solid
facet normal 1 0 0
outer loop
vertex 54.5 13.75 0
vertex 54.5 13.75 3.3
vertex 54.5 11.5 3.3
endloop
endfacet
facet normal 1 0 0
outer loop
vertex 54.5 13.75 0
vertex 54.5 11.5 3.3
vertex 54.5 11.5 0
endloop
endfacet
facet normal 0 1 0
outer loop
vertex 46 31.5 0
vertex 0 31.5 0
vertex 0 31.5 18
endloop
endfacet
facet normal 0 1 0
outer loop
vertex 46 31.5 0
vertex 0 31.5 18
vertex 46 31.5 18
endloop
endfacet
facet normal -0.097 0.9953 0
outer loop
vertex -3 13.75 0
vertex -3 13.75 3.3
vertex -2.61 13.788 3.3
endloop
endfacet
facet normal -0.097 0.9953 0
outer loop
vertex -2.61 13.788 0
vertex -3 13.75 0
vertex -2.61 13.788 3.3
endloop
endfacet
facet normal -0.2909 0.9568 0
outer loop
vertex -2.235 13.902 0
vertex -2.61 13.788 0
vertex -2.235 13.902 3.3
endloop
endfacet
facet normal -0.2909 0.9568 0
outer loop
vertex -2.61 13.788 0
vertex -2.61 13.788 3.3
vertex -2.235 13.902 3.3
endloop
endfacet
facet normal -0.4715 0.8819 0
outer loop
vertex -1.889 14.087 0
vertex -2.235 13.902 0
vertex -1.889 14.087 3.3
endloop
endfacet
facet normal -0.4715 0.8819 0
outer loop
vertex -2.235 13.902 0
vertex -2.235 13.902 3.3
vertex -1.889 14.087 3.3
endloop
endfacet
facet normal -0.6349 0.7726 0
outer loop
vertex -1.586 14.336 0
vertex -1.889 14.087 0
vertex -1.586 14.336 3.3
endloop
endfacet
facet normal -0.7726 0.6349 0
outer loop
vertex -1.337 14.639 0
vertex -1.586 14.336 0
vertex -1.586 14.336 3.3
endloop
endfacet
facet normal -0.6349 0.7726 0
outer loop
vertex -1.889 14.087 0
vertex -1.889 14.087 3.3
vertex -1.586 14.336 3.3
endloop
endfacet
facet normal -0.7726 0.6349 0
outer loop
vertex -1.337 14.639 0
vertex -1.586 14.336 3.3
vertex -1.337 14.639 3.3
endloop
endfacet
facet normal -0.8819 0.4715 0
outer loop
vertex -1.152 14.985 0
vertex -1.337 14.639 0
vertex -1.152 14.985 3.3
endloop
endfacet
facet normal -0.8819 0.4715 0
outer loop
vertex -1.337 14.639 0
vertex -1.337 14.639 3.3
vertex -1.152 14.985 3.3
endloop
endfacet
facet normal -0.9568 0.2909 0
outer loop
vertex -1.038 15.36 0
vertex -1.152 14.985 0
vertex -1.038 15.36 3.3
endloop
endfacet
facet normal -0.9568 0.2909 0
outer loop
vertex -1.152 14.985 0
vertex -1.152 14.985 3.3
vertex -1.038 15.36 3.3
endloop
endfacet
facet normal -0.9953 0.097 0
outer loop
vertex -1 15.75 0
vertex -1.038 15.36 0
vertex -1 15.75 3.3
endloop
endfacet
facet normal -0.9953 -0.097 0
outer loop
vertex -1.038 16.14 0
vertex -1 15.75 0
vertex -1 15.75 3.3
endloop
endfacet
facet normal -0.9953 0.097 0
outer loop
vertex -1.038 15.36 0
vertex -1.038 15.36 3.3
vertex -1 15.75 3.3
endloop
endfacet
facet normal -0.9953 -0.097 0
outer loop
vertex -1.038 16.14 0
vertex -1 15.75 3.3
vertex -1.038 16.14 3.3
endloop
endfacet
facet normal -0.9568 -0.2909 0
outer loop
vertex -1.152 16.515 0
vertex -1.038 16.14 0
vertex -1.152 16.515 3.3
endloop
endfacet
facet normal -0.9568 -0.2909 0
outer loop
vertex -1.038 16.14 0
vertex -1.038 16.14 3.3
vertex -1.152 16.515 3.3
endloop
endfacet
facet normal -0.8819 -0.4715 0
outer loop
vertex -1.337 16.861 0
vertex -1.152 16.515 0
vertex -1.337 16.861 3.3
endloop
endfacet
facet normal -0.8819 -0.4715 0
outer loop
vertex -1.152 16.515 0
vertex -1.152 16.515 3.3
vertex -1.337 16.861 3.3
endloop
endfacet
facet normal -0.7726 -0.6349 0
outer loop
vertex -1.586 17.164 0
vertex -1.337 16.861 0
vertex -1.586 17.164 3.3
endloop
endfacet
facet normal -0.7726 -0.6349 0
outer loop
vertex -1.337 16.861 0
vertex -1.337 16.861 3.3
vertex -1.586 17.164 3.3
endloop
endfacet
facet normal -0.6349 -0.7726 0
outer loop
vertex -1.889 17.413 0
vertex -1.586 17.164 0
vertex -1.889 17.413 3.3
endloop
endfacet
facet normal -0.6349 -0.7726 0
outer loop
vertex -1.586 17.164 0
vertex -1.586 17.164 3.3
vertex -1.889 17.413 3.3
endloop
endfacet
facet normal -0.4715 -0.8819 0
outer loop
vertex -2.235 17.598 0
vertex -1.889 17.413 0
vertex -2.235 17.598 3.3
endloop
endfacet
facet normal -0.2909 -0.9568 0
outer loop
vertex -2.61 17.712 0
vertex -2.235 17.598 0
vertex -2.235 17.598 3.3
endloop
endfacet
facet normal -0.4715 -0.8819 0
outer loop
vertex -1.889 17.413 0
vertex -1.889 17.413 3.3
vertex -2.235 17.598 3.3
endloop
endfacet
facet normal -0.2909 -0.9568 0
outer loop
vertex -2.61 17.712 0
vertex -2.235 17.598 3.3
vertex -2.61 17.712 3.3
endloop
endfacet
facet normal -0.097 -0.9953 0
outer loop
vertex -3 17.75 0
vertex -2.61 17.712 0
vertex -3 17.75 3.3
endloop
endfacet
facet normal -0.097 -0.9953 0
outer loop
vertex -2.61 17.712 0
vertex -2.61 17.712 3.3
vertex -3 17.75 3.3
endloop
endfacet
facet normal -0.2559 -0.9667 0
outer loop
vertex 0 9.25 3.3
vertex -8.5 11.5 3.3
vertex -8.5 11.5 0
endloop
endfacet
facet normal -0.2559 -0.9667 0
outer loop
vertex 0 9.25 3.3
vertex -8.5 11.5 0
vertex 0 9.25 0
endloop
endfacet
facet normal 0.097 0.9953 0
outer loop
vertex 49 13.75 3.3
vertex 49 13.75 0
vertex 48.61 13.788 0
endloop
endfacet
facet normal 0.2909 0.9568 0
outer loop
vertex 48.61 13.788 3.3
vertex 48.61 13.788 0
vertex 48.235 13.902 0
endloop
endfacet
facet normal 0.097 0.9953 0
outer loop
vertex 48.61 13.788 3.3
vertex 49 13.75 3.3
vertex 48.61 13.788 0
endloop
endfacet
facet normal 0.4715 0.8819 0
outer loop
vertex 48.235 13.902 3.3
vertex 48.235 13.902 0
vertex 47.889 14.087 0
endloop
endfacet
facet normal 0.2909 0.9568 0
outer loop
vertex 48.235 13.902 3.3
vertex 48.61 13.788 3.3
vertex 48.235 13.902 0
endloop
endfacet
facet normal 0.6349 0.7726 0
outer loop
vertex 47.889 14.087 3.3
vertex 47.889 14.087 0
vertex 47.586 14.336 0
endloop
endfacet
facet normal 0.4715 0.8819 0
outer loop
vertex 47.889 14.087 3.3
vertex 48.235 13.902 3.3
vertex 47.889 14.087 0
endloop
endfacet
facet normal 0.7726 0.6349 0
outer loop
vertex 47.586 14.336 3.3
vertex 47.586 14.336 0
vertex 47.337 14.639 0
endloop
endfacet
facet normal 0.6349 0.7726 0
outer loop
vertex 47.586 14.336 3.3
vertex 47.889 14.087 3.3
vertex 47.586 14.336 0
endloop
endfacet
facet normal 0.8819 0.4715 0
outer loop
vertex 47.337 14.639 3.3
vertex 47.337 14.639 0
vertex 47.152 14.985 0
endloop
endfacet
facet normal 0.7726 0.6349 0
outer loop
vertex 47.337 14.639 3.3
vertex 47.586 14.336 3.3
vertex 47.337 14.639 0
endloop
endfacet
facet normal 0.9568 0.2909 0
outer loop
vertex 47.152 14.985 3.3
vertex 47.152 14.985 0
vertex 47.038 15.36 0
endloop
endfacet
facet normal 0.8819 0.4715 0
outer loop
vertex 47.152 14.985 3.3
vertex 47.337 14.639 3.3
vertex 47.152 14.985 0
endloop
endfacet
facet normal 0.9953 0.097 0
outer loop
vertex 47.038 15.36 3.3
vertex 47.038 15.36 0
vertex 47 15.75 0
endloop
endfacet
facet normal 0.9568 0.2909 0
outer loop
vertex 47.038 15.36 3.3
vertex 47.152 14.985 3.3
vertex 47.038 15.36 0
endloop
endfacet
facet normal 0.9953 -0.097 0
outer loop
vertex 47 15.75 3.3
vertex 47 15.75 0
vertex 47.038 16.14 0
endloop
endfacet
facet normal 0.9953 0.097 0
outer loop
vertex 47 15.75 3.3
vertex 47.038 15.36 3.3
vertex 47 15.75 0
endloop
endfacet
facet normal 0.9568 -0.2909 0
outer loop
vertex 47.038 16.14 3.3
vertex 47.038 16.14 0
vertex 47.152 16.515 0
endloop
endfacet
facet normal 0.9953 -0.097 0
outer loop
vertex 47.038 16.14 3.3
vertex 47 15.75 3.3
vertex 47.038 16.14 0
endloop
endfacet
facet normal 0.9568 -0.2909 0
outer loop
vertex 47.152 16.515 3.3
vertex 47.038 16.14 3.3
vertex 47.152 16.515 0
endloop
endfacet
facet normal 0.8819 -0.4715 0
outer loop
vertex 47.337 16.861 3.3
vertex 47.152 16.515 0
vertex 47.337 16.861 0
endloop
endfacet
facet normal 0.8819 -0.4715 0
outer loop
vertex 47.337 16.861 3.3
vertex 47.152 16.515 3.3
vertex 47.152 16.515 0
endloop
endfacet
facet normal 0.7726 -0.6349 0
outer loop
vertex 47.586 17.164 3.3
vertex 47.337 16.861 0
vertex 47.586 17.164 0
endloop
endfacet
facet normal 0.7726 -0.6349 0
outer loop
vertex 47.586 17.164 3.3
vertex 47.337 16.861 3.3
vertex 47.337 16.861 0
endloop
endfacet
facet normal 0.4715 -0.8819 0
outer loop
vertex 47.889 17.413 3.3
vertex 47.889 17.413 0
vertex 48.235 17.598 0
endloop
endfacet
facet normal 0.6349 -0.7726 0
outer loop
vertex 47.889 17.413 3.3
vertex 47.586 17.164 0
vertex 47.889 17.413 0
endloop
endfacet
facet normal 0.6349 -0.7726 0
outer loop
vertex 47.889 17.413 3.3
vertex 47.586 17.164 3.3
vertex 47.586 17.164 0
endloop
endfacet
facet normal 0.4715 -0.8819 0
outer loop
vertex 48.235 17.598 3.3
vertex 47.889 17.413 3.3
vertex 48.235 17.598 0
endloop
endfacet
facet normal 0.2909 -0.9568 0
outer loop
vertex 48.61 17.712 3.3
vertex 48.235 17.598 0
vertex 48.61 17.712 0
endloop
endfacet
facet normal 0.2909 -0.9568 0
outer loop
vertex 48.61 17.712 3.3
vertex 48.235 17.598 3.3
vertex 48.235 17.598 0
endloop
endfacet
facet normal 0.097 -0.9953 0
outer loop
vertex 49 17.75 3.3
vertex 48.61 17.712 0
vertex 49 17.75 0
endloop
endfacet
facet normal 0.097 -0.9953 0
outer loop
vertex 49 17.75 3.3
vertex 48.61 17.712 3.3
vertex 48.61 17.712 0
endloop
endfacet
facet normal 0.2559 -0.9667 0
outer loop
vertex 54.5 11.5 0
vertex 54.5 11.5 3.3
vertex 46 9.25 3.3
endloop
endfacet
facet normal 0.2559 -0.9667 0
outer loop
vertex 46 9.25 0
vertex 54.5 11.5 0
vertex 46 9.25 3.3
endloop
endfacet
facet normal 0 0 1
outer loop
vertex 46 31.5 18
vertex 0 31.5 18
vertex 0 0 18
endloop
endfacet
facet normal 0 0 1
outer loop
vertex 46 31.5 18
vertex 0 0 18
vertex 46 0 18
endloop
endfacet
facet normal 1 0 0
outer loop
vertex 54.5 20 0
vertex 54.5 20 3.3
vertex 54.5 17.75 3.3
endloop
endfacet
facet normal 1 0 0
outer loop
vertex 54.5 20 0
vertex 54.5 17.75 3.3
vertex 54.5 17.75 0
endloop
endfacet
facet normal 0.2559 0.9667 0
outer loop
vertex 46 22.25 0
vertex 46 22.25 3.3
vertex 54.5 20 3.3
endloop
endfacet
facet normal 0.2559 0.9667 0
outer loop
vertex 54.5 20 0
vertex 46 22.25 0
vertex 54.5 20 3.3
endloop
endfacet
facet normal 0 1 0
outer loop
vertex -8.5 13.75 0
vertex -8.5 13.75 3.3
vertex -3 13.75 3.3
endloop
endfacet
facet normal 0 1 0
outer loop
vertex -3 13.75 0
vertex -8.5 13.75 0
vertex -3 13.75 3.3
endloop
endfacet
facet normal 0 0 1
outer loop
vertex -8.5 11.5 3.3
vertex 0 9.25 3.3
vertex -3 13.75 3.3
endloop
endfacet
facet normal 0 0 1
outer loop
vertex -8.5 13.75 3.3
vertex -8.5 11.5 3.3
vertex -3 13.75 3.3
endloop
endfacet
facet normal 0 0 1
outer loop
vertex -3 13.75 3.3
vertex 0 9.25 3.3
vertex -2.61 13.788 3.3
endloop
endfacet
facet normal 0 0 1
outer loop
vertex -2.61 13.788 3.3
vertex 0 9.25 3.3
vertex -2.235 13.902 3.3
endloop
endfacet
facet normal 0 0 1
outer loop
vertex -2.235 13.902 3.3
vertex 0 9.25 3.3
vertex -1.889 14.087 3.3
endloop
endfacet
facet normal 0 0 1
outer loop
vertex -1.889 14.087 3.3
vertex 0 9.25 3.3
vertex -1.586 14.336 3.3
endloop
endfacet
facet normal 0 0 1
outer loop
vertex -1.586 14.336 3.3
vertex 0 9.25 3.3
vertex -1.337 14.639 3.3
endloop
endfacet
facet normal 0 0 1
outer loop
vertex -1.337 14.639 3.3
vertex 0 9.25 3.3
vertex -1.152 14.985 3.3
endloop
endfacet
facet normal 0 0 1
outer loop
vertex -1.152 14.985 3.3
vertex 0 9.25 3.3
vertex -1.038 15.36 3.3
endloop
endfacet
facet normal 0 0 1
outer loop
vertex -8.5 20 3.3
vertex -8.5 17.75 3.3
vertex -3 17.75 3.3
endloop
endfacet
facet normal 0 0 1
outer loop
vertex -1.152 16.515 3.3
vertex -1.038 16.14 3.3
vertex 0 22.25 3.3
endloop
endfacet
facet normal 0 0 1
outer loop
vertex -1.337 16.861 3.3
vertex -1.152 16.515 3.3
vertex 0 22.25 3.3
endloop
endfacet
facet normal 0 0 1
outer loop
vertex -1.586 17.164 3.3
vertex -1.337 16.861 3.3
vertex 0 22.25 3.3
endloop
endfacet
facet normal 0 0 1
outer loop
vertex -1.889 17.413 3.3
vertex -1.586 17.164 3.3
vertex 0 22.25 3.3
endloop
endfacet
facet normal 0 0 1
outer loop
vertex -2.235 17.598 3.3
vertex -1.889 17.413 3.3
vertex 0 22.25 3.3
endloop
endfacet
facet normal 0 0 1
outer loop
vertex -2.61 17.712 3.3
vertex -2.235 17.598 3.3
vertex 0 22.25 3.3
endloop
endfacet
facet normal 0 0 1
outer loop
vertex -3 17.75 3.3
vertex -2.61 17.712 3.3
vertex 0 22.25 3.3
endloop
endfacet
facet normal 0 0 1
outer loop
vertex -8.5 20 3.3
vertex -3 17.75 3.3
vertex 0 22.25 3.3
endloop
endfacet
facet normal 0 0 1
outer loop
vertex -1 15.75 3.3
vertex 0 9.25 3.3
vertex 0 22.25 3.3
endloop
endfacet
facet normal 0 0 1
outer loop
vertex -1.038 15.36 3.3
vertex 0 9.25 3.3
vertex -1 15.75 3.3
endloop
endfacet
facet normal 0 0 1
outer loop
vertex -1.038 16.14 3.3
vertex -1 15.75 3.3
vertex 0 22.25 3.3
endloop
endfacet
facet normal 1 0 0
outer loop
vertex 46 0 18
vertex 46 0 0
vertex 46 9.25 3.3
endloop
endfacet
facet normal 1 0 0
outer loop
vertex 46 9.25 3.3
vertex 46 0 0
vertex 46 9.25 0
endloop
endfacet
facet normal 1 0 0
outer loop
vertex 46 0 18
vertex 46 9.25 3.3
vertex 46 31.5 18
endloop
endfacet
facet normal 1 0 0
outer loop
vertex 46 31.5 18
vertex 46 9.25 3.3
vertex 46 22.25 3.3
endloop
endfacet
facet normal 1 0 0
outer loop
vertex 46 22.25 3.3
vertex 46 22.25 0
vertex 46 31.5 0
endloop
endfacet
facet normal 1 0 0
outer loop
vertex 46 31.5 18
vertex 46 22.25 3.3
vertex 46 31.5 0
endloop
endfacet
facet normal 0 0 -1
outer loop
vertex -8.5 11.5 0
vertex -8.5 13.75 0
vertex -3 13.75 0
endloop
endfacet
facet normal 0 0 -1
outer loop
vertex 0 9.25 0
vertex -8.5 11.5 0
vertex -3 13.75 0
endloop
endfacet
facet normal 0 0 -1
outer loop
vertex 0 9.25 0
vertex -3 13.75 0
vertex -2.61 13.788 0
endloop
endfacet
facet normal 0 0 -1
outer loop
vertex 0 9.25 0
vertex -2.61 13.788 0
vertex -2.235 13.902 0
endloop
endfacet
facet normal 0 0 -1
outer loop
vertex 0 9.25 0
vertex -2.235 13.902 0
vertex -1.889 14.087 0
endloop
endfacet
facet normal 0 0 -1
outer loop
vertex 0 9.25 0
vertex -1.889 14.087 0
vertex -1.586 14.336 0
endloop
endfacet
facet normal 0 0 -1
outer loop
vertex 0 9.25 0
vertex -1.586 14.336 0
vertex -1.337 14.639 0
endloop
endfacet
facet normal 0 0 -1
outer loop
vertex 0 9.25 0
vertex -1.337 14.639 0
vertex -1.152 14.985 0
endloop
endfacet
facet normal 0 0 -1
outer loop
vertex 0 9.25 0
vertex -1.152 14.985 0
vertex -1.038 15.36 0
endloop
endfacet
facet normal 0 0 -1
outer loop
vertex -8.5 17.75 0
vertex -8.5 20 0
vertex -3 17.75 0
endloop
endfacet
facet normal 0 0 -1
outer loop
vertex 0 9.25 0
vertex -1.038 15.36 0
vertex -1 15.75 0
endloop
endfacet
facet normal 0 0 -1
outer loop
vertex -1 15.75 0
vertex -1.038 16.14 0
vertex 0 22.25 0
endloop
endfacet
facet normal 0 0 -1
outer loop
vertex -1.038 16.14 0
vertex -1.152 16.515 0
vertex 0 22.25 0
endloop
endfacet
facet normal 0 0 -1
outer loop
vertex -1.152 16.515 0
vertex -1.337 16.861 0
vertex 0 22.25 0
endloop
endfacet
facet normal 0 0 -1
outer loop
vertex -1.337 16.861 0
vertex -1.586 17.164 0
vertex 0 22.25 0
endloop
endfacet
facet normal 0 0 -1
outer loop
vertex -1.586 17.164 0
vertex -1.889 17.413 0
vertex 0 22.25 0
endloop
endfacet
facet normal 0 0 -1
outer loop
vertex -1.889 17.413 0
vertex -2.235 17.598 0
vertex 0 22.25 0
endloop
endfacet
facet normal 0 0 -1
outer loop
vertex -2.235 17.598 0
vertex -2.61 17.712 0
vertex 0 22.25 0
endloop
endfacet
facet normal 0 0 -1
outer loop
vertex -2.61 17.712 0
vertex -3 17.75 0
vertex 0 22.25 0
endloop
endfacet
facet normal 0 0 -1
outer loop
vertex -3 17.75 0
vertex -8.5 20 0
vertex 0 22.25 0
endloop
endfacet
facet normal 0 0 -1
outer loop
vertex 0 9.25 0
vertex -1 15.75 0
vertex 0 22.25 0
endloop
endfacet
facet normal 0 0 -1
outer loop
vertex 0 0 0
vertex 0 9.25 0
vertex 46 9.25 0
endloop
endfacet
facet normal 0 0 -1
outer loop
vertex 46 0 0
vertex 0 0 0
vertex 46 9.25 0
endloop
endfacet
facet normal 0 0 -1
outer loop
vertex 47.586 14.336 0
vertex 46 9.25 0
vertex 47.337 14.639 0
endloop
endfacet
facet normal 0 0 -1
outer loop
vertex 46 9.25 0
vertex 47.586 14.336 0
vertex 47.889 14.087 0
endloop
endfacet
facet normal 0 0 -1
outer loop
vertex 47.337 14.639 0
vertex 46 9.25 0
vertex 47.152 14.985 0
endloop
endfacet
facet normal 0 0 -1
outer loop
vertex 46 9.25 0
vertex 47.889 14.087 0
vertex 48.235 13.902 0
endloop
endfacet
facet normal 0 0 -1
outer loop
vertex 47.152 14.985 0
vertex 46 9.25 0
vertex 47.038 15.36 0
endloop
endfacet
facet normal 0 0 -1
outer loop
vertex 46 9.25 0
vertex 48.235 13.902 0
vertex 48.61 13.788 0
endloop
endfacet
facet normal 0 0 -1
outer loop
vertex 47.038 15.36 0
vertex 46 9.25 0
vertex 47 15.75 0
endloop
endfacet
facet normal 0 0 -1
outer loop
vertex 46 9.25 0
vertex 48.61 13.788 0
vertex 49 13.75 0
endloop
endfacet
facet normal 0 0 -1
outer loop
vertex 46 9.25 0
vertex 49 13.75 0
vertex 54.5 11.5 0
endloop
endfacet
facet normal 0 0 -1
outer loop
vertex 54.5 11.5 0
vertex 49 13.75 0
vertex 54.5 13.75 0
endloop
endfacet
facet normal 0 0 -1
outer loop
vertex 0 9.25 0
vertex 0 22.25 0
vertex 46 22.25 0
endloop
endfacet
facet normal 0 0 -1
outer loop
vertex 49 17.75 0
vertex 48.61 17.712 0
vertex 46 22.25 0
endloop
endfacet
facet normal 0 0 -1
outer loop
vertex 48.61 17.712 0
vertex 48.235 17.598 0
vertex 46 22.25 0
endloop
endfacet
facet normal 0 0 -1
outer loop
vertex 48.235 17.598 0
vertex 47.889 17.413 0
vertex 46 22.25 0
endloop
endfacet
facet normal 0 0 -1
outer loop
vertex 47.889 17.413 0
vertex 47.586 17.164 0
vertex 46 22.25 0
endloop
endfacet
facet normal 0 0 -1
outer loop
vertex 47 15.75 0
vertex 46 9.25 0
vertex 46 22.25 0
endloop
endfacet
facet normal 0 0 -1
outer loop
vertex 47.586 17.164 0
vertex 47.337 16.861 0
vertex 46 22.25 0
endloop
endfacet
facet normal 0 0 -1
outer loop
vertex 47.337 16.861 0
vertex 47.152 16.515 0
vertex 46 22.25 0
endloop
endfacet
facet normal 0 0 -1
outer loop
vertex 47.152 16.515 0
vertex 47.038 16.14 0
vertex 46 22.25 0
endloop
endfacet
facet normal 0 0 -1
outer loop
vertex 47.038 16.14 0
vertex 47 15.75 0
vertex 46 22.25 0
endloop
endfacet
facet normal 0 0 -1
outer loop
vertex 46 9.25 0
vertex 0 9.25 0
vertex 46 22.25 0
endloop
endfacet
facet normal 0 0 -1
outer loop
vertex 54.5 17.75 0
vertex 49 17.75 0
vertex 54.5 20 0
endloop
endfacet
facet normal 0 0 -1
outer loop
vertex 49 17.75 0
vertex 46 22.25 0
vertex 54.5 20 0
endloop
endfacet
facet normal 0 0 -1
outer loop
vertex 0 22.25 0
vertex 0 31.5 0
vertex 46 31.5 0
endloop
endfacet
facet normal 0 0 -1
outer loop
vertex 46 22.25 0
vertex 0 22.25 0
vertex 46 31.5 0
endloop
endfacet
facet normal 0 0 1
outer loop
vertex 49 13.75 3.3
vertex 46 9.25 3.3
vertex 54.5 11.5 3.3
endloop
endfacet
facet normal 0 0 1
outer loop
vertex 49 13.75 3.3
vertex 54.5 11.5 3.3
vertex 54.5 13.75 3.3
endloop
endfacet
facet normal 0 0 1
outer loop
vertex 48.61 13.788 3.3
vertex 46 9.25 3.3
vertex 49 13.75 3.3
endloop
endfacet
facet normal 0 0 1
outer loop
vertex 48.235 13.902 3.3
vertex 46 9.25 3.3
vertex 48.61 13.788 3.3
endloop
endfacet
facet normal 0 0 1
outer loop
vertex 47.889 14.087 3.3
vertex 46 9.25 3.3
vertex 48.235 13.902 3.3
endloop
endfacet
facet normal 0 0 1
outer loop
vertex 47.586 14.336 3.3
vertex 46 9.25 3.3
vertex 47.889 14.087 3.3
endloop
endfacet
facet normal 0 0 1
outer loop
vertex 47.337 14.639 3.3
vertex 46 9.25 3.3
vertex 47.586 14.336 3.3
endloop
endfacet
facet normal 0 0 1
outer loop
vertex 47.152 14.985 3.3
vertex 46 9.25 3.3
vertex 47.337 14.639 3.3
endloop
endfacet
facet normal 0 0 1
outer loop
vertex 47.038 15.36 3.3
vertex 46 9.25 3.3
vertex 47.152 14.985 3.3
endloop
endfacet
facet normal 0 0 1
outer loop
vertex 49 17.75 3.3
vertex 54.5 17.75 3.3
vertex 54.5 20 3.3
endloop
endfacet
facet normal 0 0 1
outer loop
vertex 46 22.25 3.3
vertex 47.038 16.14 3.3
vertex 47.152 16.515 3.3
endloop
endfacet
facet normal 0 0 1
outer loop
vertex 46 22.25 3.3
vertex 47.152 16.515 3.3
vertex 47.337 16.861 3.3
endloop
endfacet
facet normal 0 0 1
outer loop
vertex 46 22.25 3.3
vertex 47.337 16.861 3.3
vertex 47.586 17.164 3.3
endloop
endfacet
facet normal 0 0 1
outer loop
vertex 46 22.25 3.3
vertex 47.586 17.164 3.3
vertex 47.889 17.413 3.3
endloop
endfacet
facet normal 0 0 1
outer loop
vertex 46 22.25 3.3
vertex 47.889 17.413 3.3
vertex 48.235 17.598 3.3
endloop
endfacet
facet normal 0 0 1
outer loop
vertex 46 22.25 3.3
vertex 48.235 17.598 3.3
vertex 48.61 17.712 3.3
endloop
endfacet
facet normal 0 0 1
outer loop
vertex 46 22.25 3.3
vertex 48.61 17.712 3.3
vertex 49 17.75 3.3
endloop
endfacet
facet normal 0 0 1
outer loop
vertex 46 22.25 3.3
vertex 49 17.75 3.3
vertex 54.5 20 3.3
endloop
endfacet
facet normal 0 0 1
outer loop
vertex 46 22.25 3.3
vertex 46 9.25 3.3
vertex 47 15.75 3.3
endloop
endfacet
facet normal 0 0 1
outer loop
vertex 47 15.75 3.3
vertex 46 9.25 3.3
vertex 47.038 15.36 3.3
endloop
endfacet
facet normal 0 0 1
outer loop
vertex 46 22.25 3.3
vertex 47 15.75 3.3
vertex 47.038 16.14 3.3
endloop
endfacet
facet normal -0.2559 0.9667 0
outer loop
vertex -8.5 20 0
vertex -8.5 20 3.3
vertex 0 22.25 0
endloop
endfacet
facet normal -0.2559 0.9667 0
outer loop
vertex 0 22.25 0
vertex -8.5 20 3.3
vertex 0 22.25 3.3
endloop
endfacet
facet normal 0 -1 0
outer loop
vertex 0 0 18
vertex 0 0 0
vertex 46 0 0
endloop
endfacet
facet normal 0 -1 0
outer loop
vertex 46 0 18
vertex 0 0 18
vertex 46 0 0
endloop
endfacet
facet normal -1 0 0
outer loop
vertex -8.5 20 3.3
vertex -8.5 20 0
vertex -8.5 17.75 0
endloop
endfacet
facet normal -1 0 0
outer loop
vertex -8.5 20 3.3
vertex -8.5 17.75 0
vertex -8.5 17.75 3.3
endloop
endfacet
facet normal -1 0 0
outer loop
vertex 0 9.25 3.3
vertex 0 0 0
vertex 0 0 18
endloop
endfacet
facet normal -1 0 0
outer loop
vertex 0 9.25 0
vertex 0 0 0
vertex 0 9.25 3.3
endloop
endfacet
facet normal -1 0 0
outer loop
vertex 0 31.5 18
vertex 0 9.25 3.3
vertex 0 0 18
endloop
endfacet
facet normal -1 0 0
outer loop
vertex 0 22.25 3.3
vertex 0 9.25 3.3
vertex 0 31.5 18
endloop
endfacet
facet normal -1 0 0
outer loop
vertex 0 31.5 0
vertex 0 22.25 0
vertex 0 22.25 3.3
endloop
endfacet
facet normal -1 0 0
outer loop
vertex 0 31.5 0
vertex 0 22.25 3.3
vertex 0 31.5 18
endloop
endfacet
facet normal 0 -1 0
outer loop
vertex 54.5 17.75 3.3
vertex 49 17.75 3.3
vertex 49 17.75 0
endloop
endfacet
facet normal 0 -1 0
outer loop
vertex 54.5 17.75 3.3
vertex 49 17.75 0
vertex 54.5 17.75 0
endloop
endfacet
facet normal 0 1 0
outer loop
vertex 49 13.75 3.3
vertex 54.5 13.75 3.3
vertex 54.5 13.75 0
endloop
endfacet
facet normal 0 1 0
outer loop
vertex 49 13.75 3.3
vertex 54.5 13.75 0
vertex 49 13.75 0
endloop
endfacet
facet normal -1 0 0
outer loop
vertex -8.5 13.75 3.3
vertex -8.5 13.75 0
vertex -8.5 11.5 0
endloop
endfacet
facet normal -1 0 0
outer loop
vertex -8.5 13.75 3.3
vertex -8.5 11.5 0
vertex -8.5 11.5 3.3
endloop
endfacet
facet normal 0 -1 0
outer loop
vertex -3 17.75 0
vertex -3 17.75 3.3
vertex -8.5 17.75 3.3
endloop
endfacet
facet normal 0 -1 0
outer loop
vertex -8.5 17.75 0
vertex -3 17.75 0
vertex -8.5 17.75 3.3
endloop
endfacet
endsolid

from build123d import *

# Parameters (mm, degrees)
SKETCH_1_W          = 46
SKETCH_1_H          = 31.5
EXTRUDE_1_DEPTH     = 18
SKETCH_3_W          = 3.3
SKETCH_3_H          = 13
EXTRUDE_2_DEPTH     = 8.5
SKETCH_4_W          = 3.3
SKETCH_4_H          = 13
EXTRUDE_3_DEPTH     = 8.5
CUT_EXTRUDE_1_DEPTH = 65.642014201
CUT_EXTRUDE_2_DEPTH = 65.642014201


with BuildPart() as part:
    # 草图1 → 凸台-拉伸1 (new body)
    with BuildSketch(Plane.XY):
        with Locations((23, 15.75)):
            Rectangle(SKETCH_1_W, SKETCH_1_H)
    extrude(amount=EXTRUDE_1_DEPTH)

    # 草图3 → 凸台-拉伸2 (add)
    with BuildSketch(Plane.ZY):
        with Locations((1.65, 15.75)):
            Rectangle(SKETCH_3_W, SKETCH_3_H)
    extrude(amount=EXTRUDE_2_DEPTH)

    # 草图4 → 凸台-拉伸3 (add)
    with BuildSketch(Plane(origin=(46, 0, 0), x_dir=(0, 0, -1), z_dir=(1, 0, 0))):
        with Locations((-1.65, 15.75)):
            Rectangle(SKETCH_4_W, SKETCH_4_H)
    extrude(amount=EXTRUDE_3_DEPTH)

    # 草图5 → 切除-拉伸1 (cut, through all)
    with BuildSketch(Plane.XY.offset(3.3)):
        Polygon((-8.5, 22.25), (-8.5, 20), (0, 22.25), align=None)
        Polygon((-8.5, 11.5), (0, 9.25), (-8.5, 9.25), align=None)
        with BuildLine():
            Line((-3, 17.75), (-8.5, 17.75))
            Line((-8.5, 17.75), (-8.5, 13.75))
            Line((-8.5, 13.75), (-3, 13.75))
            ThreePointArc((-3, 13.75), (-1, 15.75), (-3, 17.75))
        make_face()
    extrude(amount=-CUT_EXTRUDE_1_DEPTH, mode=Mode.SUBTRACT)

    # 草图6 → 切除-拉伸2 (cut, through all)
    with BuildSketch(Plane.XY.offset(3.3)):
        Polygon((46, 22.25), (54.5, 20), (54.5, 22.25), align=None)
        Polygon((46, 9.25), (54.5, 9.25), (54.5, 11.5), align=None)
        with BuildLine():
            Line((49, 17.75), (54.5, 17.75))
            Line((54.5, 17.75), (54.5, 13.75))
            Line((54.5, 13.75), (49, 13.75))
            ThreePointArc((49, 13.75), (47, 15.75), (49, 17.75))
        make_face()
    extrude(amount=-CUT_EXTRUDE_2_DEPTH, mode=Mode.SUBTRACT)


solid = part.part
